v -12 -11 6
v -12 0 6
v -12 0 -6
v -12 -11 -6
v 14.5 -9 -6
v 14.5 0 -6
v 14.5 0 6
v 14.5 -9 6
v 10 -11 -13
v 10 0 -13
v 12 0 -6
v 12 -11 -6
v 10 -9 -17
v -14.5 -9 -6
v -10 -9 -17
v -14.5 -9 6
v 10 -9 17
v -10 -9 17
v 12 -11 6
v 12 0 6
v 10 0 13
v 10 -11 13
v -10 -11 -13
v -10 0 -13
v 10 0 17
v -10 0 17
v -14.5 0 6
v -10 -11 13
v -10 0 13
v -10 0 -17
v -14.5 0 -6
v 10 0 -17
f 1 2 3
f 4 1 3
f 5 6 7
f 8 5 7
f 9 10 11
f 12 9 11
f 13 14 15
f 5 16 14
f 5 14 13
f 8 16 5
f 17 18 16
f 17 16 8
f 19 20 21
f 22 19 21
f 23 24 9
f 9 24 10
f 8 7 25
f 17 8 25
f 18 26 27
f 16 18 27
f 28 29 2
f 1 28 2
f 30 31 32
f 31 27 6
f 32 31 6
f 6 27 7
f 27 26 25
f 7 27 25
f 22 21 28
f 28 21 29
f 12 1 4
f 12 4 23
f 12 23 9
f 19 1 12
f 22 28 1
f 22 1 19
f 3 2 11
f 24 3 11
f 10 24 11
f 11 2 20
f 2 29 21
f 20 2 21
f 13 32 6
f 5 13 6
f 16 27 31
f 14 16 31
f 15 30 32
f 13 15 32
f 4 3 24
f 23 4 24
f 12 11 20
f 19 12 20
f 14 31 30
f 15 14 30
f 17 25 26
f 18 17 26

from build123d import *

# Parameters (mm, degrees)
F1_DEPTH = 9
F3_DEPTH = 11


with BuildPart() as f1:
    # F0 (on Front) → F1 (new body)
    with BuildSketch(Plane.XZ):
        Polygon((10, 17), (0, 17), (0, 0), (14.5, 0), (14.5, 6), align=None)
        Polygon((0, 0), (0, 17), (-10, 17), (-14.5, 6), (-14.5, 0), align=None)
        Polygon((14.5, 0), (0, 0), (0, -17), (10, -17), (14.5, -6), align=None)
        Polygon((0, -17), (0, 0), (-14.5, 0), (-14.5, -6), (-10, -17), align=None)
    extrude(amount=F1_DEPTH)


with BuildPart() as f3:
    # F2 (on Front) → F3 (new body)
    with BuildSketch(Plane.XZ):
        Polygon((-10, 13), (-12, 6), (-12, -6), (-10, -13), (10, -13), (12, -6), (12, 6), (10, 13), align=None)
    extrude(amount=F3_DEPTH)


solid = Compound([f1.part, f3.part])
